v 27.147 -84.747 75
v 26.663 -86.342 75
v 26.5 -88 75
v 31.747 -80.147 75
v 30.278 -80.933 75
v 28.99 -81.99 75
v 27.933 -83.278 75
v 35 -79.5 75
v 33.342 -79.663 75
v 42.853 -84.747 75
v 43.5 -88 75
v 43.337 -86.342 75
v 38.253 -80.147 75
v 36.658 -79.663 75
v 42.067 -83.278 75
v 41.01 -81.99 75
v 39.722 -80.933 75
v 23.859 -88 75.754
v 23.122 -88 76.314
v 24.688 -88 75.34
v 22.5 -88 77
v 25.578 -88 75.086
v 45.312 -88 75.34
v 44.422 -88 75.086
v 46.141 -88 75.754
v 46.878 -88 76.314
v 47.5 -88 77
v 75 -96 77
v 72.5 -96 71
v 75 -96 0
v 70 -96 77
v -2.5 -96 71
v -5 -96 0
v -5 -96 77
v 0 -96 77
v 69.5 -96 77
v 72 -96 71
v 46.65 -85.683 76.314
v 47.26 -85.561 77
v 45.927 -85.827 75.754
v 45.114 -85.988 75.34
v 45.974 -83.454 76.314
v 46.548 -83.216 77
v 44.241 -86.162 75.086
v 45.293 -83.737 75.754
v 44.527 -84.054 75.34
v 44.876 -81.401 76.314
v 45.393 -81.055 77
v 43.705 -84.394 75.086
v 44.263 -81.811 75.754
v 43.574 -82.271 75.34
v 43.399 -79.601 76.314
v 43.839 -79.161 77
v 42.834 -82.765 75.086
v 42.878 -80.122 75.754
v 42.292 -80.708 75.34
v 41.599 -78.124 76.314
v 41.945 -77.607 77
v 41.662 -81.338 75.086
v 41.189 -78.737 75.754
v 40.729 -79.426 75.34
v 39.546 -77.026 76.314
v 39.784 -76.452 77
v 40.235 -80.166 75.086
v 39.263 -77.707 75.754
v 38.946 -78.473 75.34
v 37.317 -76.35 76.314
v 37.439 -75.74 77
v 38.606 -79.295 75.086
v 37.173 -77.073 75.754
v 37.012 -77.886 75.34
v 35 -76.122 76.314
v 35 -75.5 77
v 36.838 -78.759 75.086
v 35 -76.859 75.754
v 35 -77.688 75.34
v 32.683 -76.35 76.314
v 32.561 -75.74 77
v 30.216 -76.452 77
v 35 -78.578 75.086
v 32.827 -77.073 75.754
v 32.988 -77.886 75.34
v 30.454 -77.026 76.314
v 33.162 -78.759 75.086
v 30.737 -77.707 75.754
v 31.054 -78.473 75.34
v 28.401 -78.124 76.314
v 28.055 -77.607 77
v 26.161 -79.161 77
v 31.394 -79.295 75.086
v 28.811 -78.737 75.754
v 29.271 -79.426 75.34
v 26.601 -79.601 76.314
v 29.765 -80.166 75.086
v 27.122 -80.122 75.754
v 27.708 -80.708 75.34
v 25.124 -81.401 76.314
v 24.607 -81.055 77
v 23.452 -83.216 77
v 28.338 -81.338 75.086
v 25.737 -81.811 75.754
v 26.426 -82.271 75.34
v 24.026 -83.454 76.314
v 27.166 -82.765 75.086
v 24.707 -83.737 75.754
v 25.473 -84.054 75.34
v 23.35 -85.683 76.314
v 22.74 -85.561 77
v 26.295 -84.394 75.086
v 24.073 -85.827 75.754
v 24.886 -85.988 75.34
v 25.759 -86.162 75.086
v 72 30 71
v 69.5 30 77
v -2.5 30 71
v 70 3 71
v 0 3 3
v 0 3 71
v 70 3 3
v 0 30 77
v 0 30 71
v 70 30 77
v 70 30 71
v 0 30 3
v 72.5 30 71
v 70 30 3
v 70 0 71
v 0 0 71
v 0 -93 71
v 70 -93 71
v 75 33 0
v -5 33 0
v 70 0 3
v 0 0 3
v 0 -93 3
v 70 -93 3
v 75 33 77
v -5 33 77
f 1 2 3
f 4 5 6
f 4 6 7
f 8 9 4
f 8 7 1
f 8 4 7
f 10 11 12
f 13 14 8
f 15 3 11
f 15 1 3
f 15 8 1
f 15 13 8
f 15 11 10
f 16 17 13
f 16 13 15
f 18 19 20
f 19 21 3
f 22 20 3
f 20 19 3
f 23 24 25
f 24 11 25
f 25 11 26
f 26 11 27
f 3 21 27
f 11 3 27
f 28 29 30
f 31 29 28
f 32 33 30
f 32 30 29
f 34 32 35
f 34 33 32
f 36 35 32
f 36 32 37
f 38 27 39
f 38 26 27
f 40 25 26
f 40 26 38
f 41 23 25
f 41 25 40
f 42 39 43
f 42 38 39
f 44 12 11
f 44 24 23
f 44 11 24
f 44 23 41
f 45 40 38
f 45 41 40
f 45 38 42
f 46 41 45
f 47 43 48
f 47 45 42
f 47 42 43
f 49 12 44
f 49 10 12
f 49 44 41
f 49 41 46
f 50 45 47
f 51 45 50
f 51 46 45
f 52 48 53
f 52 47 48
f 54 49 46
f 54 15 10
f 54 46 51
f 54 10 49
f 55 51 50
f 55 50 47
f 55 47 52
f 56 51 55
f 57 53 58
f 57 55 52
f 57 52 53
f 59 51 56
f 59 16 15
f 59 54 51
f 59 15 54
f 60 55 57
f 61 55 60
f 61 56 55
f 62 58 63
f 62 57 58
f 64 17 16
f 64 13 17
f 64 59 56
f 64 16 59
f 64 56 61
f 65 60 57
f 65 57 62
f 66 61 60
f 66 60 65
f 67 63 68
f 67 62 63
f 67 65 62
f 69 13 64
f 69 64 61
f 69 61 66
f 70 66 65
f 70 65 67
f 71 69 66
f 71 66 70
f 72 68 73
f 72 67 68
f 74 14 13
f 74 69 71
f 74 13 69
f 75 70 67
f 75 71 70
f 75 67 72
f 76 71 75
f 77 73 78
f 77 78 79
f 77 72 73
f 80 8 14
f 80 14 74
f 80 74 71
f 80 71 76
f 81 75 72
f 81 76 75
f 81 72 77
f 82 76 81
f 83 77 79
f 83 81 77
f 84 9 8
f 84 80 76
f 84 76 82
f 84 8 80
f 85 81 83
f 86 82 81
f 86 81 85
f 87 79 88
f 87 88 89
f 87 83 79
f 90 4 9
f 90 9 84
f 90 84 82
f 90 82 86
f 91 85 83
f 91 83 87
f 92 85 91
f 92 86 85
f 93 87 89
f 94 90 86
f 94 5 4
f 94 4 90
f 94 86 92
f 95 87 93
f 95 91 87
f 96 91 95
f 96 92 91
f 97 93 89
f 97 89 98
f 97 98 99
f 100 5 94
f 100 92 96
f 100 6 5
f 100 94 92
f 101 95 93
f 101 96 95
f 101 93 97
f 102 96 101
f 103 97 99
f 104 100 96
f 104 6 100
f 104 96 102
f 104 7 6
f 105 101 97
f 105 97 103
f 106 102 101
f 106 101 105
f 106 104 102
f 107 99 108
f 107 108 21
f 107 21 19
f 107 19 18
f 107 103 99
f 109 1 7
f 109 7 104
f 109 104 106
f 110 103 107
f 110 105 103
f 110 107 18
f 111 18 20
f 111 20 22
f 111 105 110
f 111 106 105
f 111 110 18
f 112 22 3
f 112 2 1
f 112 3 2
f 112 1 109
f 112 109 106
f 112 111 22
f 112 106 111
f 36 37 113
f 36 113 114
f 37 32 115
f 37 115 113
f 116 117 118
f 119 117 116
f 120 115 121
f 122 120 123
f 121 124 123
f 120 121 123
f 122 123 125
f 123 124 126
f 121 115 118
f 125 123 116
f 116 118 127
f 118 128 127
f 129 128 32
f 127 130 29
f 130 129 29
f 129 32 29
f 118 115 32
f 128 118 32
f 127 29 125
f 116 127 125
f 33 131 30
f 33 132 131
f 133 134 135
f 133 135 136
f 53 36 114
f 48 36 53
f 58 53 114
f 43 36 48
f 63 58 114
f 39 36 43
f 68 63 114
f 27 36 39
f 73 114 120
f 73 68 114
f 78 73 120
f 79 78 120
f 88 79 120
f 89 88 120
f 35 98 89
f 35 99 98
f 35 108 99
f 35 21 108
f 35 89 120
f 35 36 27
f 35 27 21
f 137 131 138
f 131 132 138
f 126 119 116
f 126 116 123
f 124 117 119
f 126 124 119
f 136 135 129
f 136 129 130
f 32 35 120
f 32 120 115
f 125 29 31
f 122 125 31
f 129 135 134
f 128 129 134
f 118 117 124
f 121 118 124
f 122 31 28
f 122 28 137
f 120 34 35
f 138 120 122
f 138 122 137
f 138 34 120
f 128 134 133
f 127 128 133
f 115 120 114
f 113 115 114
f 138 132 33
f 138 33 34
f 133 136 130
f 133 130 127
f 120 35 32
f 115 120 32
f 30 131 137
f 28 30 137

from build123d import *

# Parameters (mm, degrees)
F0_W         = 76
F0_H         = 99
F0_W_2       = 70
F0_H_2       = 93
F1_DEPTH     = 77
F2_T         = -3
F3_DEPTH     = 30
F4_T         = -3
F5_DEPTH     = 2
F6_DEPTH     = 2
F8_DEPTH     = 126
F10_DEPTH    = 126
F12_DEPTH    = 2
F13_T2_ANGLE = 180


# Not quite as in the source:
# - a fillet or chamfer that OpenCascade refuses, or shapes differently, is made with other operations: its cross-section is extruded or revolved along the edge and cut away or added


with BuildPart() as f1:
    # F0 (on Top) → F1 (new body)
    with BuildSketch(Plane.XY):
        with Locations((35, -46.5)):
            Rectangle(F0_W, F0_H)
        with Locations((35, -46.5)):
            Rectangle(F0_W_2, F0_H_2, mode=Mode.SUBTRACT)
        with Locations((35, -46.5)):
            Rectangle(F0_W_2, F0_H_2)
    extrude(amount=F1_DEPTH)

    # F2
    f2_openings = [f1.faces().sort_by_distance(p)[0] for p in [
        (35, -46.5, 77),
    ]]
    offset(amount=F2_T, openings=f2_openings)

    # F3 (add): a face of the model
    f3_faces = [f1.faces().sort_by_distance(p)[0] for p in [
        (35, 3, 38.5),
    ]]
    extrude(f3_faces, amount=F3_DEPTH)

    # F4: a shell. OpenCascade refuses it in one call, so the cavity is built on its own and cut out:
    # the body offset inwards by the wall thickness, plus a prism from it out through each open face.
    f4_core = offset(f1.part, amount=F4_T, kind=Kind.INTERSECTION, mode=Mode.PRIVATE)
    f4_exits = [f4_core.faces().sort_by_distance(p)[0] for p in [
        (35, 16.5, 74),
    ]]
    add(f4_core, mode=Mode.SUBTRACT)
    extrude(f4_exits, amount=-F4_T, mode=Mode.SUBTRACT)

    # F5 (add): a face of the model
    f5_faces = [f1.faces().sort_by_distance(p)[0] for p in [
        (-3, -31.5, 38.5),
    ]]
    extrude(f5_faces, amount=F5_DEPTH)

    # F6 (add): a face of the model
    f6_faces = [f1.faces().sort_by_distance(p)[0] for p in [
        (73, -31.5, 38.5),
    ]]
    extrude(f6_faces, amount=F6_DEPTH)

    # F7 (on face) → F8 (cut, through all)
    with BuildSketch(Plane.XZ.offset(96)):
        Polygon((70, 77), (0, 77), (-2.5, 71), (72.5, 71), align=None)
    extrude(amount=-F8_DEPTH, mode=Mode.SUBTRACT)


with BuildPart() as f10:
    # F9 (on face) → F10 (new body, through all)
    with BuildSketch(Plane.XZ.offset(96)):
        Polygon((69.5, 77), (0, 77), (-2.5, 71), (72, 71), align=None)
    extrude(amount=-F10_DEPTH)

    # F11 (on face) → F12 (cut)
    with BuildSketch(Plane.XY.offset(77)):
        with BuildLine():
            Line((22.5, -88), (47.5, -88))
            ThreePointArc((47.5, -88), (35, -75.5), (22.5, -88))
        make_face()
    extrude(amount=-F12_DEPTH, mode=Mode.SUBTRACT)

    # F13: fillet of radius 5 on 1 edges, made by hand

    # F13_s1 → F13_t2 (revolve)
    with BuildSketch(Plane.XZ.offset(88)):
        with BuildLine():
            ThreePointArc((47.5, 77), (45.7360679775, 75.527864045), (43.5, 75))
            Line((43.5, 75), (47.5, 75))
            Line((47.5, 75), (47.5, 77))
        make_face()
    revolve(axis=Axis((35, -88, 75), (0, 0, 1)), revolution_arc=F13_T2_ANGLE)


solid = Compound([f1.part, f10.part])
